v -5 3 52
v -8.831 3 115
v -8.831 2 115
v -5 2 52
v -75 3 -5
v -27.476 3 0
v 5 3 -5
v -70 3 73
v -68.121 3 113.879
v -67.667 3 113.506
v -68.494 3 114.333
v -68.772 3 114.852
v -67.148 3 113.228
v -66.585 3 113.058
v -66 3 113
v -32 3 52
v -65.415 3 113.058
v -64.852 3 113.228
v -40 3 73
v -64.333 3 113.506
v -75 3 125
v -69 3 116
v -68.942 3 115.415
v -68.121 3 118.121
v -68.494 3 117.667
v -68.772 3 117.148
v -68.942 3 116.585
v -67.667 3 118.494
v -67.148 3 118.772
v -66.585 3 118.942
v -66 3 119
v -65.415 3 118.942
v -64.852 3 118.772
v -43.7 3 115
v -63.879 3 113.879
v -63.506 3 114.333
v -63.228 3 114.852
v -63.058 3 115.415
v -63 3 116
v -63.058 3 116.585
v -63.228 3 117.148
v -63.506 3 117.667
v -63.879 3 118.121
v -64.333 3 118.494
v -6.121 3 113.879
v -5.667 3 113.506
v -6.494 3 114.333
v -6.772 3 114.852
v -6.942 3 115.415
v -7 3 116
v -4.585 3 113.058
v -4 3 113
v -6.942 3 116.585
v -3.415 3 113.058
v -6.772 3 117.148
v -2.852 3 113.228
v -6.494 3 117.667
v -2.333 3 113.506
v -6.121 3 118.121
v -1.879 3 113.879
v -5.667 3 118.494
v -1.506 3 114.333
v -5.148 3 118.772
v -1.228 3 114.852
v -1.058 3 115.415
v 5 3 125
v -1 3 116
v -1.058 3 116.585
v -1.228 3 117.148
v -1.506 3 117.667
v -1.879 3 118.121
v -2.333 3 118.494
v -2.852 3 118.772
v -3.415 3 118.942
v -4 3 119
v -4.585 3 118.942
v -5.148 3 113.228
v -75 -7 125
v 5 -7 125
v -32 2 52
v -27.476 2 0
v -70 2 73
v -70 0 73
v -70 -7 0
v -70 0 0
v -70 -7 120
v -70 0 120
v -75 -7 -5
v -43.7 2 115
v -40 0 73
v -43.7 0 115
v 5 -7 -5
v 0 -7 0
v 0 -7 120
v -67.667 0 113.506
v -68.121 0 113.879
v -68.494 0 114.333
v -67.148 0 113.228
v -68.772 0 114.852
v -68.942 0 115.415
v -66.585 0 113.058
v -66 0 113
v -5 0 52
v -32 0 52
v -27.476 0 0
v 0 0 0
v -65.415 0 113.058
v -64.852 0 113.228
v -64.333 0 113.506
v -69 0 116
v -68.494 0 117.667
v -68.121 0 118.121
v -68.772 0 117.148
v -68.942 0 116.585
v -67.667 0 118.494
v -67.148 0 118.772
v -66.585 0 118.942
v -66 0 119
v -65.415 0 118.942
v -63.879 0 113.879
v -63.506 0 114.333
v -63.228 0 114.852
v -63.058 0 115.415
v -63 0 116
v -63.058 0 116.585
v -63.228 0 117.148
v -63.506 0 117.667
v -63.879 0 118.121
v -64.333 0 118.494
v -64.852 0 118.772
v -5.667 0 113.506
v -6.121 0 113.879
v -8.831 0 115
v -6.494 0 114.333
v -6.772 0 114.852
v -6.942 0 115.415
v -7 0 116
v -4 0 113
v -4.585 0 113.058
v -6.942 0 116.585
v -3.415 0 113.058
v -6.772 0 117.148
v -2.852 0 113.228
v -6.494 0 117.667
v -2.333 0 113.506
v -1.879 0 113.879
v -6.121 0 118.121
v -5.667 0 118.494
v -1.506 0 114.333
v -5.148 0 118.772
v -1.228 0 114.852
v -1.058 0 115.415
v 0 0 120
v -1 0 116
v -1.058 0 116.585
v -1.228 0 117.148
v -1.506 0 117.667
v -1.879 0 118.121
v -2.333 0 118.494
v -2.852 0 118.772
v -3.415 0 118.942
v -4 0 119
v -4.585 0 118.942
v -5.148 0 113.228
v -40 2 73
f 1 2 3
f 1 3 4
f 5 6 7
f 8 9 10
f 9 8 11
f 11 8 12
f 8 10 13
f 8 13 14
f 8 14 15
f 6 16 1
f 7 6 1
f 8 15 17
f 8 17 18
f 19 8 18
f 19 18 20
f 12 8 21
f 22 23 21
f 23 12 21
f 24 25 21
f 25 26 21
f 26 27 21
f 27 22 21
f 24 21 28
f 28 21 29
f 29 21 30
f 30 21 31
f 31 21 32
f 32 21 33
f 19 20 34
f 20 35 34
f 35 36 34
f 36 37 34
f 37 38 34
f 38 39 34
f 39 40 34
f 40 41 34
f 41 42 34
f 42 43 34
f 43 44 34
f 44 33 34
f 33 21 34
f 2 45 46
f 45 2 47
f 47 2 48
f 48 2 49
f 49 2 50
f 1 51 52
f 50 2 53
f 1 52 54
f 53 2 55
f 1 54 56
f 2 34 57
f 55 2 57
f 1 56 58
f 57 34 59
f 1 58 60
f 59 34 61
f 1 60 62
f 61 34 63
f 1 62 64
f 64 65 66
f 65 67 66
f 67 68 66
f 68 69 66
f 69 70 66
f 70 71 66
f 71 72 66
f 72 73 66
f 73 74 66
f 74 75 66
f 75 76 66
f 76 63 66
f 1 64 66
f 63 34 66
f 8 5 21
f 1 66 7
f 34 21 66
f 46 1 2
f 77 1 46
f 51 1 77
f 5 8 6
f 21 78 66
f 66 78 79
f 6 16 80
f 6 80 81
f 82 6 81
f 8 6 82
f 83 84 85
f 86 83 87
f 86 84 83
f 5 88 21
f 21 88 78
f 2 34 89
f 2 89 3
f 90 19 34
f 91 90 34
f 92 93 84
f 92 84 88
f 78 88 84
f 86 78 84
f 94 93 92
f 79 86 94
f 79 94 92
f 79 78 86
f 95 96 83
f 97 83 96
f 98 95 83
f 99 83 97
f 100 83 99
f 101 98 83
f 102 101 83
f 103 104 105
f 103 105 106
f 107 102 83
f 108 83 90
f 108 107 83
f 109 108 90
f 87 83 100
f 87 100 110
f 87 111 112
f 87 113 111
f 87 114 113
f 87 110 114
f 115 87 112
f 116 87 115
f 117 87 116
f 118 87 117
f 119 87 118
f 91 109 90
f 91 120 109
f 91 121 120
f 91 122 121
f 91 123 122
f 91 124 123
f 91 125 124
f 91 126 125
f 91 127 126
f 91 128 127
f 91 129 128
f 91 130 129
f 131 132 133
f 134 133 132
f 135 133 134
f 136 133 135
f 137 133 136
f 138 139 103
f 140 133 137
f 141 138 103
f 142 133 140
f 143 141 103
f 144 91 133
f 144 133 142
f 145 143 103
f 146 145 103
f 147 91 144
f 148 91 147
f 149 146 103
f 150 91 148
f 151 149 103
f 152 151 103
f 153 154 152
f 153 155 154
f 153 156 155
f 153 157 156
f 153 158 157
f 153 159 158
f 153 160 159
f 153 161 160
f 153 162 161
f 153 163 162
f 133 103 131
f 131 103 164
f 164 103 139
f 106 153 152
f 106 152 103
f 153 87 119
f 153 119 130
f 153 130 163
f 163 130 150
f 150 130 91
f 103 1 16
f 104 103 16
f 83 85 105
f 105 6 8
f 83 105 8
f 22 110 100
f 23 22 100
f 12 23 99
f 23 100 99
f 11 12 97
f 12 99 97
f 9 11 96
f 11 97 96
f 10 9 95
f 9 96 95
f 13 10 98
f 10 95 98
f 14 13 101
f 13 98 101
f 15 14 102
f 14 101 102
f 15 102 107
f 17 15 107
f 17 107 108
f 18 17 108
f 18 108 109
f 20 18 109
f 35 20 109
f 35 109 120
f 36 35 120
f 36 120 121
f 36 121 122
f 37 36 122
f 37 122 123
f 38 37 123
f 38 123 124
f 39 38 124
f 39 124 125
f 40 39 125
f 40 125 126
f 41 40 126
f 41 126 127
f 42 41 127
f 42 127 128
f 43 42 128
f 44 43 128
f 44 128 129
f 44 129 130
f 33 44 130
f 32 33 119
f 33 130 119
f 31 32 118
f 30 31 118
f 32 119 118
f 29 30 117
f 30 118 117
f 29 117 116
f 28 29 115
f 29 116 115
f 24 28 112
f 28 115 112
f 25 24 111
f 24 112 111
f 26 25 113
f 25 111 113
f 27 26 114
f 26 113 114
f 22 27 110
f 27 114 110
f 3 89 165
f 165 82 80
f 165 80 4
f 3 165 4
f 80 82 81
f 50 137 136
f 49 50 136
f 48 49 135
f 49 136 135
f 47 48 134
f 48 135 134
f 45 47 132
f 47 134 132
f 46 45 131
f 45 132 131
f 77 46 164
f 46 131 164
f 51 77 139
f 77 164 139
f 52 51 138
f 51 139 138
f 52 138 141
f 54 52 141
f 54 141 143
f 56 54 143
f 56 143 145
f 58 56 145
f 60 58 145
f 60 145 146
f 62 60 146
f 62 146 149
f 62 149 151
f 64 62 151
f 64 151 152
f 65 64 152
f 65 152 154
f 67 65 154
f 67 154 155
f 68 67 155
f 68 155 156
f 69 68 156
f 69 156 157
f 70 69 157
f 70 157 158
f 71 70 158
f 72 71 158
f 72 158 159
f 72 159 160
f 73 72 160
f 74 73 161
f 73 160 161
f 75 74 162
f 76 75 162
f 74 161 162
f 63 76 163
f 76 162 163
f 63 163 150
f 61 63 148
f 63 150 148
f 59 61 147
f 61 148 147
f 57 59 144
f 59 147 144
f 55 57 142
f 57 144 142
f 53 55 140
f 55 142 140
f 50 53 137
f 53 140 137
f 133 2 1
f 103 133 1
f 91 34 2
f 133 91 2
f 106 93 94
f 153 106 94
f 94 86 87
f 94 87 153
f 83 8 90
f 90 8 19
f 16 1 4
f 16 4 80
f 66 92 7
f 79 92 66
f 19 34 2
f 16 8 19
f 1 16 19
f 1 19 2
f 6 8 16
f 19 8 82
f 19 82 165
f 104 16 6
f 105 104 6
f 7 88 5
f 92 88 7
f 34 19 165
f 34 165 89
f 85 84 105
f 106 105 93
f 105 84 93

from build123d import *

# Parameters (mm, degrees)
SKETCH1_W                    = 80
SKETCH1_H                    = 130
BOSS_EXTRUDE1_DEPTH          = 10
SKETCH2_W                    = 70
SKETCH2_H                    = 120
CUT_EXTRUDE1_DEPTH           = 7
CUT_EXTRUDE2_DEPTH           = 11
DRAFT1_ANGLE                 = -5.033852659
DRAFT2_ANGLE                 = 3.479843222
F_6_0_6_DIAMETER_HOLE1_D     = 6
F_6_0_6_DIAMETER_HOLE1_DEPTH = 10
BOSS_EXTRUDE2_DEPTH          = 1


with BuildPart() as part:
    # Sketch1 → Boss-Extrude1 (new body)
    with BuildSketch(Plane.XZ.offset(7)):
        with Locations((-35, 60)):
            Rectangle(SKETCH1_W, SKETCH1_H)
    extrude(amount=-BOSS_EXTRUDE1_DEPTH)

    # Sketch2 → Cut-Extrude1 (cut)
    with BuildSketch(Plane.XZ.offset(7)):
        with Locations((-35, 60)):
            Rectangle(SKETCH2_W, SKETCH2_H)
    extrude(amount=-CUT_EXTRUDE1_DEPTH, mode=Mode.SUBTRACT)

    # Sketch3 → Cut-Extrude2 (cut, through all)
    with BuildSketch(Plane(origin=(0, 3, 0), x_dir=(-1, 0, 0), z_dir=(0, 1, 0))):
        Polygon((40, 115), (8.830999101, 115), (8.830999101, 52), (32, 52), (27.476443014, 0), (70, 73), (40, 73), align=None)
    extrude(amount=-CUT_EXTRUDE2_DEPTH, mode=Mode.SUBTRACT)

    # Draft1
    draft1_faces = [part.faces().sort_by_distance(p)[0] for p in [
        (-40, 1.5, 94),
    ]]
    draft(draft1_faces, Plane(origin=(-70, -7, 73), x_dir=(-1, 0, 0), z_dir=(0, 0, -1)), DRAFT1_ANGLE)

    # Draft2
    draft2_faces = [part.faces().sort_by_distance(p)[0] for p in [
        (-8.830999101, 1.5, 83.5),
    ]]
    draft(draft2_faces, Plane(origin=(-40, -7, 115), x_dir=(-1, 0, 0), z_dir=(0, 0, -1)), DRAFT2_ANGLE)

    # Ø6.0 (6) Diameter Hole1
    with Locations(Plane(origin=(0, 3, 0), x_dir=(1, 0, 0), z_dir=(0, 1, 0))):
        with Locations((-66, -116), (-4, -116)):
            Hole(F_6_0_6_DIAMETER_HOLE1_D / 2, depth=F_6_0_6_DIAMETER_HOLE1_DEPTH)


with BuildPart() as body_2:
    # Sketch6 → Boss-Extrude2 (new body)
    with BuildSketch(Plane(origin=(0, 3, 0), x_dir=(1, 0, 0), z_dir=(0, 1, 0))):
        Polygon((-5, -52), (-32, -52), (-27.476443014, 0), (-70, -73), (-40, -73), (-43.699530401, -115), (-8.830999101, -115), align=None)
    extrude(amount=-BOSS_EXTRUDE2_DEPTH)


solid = Compound([part.part, body_2.part])
